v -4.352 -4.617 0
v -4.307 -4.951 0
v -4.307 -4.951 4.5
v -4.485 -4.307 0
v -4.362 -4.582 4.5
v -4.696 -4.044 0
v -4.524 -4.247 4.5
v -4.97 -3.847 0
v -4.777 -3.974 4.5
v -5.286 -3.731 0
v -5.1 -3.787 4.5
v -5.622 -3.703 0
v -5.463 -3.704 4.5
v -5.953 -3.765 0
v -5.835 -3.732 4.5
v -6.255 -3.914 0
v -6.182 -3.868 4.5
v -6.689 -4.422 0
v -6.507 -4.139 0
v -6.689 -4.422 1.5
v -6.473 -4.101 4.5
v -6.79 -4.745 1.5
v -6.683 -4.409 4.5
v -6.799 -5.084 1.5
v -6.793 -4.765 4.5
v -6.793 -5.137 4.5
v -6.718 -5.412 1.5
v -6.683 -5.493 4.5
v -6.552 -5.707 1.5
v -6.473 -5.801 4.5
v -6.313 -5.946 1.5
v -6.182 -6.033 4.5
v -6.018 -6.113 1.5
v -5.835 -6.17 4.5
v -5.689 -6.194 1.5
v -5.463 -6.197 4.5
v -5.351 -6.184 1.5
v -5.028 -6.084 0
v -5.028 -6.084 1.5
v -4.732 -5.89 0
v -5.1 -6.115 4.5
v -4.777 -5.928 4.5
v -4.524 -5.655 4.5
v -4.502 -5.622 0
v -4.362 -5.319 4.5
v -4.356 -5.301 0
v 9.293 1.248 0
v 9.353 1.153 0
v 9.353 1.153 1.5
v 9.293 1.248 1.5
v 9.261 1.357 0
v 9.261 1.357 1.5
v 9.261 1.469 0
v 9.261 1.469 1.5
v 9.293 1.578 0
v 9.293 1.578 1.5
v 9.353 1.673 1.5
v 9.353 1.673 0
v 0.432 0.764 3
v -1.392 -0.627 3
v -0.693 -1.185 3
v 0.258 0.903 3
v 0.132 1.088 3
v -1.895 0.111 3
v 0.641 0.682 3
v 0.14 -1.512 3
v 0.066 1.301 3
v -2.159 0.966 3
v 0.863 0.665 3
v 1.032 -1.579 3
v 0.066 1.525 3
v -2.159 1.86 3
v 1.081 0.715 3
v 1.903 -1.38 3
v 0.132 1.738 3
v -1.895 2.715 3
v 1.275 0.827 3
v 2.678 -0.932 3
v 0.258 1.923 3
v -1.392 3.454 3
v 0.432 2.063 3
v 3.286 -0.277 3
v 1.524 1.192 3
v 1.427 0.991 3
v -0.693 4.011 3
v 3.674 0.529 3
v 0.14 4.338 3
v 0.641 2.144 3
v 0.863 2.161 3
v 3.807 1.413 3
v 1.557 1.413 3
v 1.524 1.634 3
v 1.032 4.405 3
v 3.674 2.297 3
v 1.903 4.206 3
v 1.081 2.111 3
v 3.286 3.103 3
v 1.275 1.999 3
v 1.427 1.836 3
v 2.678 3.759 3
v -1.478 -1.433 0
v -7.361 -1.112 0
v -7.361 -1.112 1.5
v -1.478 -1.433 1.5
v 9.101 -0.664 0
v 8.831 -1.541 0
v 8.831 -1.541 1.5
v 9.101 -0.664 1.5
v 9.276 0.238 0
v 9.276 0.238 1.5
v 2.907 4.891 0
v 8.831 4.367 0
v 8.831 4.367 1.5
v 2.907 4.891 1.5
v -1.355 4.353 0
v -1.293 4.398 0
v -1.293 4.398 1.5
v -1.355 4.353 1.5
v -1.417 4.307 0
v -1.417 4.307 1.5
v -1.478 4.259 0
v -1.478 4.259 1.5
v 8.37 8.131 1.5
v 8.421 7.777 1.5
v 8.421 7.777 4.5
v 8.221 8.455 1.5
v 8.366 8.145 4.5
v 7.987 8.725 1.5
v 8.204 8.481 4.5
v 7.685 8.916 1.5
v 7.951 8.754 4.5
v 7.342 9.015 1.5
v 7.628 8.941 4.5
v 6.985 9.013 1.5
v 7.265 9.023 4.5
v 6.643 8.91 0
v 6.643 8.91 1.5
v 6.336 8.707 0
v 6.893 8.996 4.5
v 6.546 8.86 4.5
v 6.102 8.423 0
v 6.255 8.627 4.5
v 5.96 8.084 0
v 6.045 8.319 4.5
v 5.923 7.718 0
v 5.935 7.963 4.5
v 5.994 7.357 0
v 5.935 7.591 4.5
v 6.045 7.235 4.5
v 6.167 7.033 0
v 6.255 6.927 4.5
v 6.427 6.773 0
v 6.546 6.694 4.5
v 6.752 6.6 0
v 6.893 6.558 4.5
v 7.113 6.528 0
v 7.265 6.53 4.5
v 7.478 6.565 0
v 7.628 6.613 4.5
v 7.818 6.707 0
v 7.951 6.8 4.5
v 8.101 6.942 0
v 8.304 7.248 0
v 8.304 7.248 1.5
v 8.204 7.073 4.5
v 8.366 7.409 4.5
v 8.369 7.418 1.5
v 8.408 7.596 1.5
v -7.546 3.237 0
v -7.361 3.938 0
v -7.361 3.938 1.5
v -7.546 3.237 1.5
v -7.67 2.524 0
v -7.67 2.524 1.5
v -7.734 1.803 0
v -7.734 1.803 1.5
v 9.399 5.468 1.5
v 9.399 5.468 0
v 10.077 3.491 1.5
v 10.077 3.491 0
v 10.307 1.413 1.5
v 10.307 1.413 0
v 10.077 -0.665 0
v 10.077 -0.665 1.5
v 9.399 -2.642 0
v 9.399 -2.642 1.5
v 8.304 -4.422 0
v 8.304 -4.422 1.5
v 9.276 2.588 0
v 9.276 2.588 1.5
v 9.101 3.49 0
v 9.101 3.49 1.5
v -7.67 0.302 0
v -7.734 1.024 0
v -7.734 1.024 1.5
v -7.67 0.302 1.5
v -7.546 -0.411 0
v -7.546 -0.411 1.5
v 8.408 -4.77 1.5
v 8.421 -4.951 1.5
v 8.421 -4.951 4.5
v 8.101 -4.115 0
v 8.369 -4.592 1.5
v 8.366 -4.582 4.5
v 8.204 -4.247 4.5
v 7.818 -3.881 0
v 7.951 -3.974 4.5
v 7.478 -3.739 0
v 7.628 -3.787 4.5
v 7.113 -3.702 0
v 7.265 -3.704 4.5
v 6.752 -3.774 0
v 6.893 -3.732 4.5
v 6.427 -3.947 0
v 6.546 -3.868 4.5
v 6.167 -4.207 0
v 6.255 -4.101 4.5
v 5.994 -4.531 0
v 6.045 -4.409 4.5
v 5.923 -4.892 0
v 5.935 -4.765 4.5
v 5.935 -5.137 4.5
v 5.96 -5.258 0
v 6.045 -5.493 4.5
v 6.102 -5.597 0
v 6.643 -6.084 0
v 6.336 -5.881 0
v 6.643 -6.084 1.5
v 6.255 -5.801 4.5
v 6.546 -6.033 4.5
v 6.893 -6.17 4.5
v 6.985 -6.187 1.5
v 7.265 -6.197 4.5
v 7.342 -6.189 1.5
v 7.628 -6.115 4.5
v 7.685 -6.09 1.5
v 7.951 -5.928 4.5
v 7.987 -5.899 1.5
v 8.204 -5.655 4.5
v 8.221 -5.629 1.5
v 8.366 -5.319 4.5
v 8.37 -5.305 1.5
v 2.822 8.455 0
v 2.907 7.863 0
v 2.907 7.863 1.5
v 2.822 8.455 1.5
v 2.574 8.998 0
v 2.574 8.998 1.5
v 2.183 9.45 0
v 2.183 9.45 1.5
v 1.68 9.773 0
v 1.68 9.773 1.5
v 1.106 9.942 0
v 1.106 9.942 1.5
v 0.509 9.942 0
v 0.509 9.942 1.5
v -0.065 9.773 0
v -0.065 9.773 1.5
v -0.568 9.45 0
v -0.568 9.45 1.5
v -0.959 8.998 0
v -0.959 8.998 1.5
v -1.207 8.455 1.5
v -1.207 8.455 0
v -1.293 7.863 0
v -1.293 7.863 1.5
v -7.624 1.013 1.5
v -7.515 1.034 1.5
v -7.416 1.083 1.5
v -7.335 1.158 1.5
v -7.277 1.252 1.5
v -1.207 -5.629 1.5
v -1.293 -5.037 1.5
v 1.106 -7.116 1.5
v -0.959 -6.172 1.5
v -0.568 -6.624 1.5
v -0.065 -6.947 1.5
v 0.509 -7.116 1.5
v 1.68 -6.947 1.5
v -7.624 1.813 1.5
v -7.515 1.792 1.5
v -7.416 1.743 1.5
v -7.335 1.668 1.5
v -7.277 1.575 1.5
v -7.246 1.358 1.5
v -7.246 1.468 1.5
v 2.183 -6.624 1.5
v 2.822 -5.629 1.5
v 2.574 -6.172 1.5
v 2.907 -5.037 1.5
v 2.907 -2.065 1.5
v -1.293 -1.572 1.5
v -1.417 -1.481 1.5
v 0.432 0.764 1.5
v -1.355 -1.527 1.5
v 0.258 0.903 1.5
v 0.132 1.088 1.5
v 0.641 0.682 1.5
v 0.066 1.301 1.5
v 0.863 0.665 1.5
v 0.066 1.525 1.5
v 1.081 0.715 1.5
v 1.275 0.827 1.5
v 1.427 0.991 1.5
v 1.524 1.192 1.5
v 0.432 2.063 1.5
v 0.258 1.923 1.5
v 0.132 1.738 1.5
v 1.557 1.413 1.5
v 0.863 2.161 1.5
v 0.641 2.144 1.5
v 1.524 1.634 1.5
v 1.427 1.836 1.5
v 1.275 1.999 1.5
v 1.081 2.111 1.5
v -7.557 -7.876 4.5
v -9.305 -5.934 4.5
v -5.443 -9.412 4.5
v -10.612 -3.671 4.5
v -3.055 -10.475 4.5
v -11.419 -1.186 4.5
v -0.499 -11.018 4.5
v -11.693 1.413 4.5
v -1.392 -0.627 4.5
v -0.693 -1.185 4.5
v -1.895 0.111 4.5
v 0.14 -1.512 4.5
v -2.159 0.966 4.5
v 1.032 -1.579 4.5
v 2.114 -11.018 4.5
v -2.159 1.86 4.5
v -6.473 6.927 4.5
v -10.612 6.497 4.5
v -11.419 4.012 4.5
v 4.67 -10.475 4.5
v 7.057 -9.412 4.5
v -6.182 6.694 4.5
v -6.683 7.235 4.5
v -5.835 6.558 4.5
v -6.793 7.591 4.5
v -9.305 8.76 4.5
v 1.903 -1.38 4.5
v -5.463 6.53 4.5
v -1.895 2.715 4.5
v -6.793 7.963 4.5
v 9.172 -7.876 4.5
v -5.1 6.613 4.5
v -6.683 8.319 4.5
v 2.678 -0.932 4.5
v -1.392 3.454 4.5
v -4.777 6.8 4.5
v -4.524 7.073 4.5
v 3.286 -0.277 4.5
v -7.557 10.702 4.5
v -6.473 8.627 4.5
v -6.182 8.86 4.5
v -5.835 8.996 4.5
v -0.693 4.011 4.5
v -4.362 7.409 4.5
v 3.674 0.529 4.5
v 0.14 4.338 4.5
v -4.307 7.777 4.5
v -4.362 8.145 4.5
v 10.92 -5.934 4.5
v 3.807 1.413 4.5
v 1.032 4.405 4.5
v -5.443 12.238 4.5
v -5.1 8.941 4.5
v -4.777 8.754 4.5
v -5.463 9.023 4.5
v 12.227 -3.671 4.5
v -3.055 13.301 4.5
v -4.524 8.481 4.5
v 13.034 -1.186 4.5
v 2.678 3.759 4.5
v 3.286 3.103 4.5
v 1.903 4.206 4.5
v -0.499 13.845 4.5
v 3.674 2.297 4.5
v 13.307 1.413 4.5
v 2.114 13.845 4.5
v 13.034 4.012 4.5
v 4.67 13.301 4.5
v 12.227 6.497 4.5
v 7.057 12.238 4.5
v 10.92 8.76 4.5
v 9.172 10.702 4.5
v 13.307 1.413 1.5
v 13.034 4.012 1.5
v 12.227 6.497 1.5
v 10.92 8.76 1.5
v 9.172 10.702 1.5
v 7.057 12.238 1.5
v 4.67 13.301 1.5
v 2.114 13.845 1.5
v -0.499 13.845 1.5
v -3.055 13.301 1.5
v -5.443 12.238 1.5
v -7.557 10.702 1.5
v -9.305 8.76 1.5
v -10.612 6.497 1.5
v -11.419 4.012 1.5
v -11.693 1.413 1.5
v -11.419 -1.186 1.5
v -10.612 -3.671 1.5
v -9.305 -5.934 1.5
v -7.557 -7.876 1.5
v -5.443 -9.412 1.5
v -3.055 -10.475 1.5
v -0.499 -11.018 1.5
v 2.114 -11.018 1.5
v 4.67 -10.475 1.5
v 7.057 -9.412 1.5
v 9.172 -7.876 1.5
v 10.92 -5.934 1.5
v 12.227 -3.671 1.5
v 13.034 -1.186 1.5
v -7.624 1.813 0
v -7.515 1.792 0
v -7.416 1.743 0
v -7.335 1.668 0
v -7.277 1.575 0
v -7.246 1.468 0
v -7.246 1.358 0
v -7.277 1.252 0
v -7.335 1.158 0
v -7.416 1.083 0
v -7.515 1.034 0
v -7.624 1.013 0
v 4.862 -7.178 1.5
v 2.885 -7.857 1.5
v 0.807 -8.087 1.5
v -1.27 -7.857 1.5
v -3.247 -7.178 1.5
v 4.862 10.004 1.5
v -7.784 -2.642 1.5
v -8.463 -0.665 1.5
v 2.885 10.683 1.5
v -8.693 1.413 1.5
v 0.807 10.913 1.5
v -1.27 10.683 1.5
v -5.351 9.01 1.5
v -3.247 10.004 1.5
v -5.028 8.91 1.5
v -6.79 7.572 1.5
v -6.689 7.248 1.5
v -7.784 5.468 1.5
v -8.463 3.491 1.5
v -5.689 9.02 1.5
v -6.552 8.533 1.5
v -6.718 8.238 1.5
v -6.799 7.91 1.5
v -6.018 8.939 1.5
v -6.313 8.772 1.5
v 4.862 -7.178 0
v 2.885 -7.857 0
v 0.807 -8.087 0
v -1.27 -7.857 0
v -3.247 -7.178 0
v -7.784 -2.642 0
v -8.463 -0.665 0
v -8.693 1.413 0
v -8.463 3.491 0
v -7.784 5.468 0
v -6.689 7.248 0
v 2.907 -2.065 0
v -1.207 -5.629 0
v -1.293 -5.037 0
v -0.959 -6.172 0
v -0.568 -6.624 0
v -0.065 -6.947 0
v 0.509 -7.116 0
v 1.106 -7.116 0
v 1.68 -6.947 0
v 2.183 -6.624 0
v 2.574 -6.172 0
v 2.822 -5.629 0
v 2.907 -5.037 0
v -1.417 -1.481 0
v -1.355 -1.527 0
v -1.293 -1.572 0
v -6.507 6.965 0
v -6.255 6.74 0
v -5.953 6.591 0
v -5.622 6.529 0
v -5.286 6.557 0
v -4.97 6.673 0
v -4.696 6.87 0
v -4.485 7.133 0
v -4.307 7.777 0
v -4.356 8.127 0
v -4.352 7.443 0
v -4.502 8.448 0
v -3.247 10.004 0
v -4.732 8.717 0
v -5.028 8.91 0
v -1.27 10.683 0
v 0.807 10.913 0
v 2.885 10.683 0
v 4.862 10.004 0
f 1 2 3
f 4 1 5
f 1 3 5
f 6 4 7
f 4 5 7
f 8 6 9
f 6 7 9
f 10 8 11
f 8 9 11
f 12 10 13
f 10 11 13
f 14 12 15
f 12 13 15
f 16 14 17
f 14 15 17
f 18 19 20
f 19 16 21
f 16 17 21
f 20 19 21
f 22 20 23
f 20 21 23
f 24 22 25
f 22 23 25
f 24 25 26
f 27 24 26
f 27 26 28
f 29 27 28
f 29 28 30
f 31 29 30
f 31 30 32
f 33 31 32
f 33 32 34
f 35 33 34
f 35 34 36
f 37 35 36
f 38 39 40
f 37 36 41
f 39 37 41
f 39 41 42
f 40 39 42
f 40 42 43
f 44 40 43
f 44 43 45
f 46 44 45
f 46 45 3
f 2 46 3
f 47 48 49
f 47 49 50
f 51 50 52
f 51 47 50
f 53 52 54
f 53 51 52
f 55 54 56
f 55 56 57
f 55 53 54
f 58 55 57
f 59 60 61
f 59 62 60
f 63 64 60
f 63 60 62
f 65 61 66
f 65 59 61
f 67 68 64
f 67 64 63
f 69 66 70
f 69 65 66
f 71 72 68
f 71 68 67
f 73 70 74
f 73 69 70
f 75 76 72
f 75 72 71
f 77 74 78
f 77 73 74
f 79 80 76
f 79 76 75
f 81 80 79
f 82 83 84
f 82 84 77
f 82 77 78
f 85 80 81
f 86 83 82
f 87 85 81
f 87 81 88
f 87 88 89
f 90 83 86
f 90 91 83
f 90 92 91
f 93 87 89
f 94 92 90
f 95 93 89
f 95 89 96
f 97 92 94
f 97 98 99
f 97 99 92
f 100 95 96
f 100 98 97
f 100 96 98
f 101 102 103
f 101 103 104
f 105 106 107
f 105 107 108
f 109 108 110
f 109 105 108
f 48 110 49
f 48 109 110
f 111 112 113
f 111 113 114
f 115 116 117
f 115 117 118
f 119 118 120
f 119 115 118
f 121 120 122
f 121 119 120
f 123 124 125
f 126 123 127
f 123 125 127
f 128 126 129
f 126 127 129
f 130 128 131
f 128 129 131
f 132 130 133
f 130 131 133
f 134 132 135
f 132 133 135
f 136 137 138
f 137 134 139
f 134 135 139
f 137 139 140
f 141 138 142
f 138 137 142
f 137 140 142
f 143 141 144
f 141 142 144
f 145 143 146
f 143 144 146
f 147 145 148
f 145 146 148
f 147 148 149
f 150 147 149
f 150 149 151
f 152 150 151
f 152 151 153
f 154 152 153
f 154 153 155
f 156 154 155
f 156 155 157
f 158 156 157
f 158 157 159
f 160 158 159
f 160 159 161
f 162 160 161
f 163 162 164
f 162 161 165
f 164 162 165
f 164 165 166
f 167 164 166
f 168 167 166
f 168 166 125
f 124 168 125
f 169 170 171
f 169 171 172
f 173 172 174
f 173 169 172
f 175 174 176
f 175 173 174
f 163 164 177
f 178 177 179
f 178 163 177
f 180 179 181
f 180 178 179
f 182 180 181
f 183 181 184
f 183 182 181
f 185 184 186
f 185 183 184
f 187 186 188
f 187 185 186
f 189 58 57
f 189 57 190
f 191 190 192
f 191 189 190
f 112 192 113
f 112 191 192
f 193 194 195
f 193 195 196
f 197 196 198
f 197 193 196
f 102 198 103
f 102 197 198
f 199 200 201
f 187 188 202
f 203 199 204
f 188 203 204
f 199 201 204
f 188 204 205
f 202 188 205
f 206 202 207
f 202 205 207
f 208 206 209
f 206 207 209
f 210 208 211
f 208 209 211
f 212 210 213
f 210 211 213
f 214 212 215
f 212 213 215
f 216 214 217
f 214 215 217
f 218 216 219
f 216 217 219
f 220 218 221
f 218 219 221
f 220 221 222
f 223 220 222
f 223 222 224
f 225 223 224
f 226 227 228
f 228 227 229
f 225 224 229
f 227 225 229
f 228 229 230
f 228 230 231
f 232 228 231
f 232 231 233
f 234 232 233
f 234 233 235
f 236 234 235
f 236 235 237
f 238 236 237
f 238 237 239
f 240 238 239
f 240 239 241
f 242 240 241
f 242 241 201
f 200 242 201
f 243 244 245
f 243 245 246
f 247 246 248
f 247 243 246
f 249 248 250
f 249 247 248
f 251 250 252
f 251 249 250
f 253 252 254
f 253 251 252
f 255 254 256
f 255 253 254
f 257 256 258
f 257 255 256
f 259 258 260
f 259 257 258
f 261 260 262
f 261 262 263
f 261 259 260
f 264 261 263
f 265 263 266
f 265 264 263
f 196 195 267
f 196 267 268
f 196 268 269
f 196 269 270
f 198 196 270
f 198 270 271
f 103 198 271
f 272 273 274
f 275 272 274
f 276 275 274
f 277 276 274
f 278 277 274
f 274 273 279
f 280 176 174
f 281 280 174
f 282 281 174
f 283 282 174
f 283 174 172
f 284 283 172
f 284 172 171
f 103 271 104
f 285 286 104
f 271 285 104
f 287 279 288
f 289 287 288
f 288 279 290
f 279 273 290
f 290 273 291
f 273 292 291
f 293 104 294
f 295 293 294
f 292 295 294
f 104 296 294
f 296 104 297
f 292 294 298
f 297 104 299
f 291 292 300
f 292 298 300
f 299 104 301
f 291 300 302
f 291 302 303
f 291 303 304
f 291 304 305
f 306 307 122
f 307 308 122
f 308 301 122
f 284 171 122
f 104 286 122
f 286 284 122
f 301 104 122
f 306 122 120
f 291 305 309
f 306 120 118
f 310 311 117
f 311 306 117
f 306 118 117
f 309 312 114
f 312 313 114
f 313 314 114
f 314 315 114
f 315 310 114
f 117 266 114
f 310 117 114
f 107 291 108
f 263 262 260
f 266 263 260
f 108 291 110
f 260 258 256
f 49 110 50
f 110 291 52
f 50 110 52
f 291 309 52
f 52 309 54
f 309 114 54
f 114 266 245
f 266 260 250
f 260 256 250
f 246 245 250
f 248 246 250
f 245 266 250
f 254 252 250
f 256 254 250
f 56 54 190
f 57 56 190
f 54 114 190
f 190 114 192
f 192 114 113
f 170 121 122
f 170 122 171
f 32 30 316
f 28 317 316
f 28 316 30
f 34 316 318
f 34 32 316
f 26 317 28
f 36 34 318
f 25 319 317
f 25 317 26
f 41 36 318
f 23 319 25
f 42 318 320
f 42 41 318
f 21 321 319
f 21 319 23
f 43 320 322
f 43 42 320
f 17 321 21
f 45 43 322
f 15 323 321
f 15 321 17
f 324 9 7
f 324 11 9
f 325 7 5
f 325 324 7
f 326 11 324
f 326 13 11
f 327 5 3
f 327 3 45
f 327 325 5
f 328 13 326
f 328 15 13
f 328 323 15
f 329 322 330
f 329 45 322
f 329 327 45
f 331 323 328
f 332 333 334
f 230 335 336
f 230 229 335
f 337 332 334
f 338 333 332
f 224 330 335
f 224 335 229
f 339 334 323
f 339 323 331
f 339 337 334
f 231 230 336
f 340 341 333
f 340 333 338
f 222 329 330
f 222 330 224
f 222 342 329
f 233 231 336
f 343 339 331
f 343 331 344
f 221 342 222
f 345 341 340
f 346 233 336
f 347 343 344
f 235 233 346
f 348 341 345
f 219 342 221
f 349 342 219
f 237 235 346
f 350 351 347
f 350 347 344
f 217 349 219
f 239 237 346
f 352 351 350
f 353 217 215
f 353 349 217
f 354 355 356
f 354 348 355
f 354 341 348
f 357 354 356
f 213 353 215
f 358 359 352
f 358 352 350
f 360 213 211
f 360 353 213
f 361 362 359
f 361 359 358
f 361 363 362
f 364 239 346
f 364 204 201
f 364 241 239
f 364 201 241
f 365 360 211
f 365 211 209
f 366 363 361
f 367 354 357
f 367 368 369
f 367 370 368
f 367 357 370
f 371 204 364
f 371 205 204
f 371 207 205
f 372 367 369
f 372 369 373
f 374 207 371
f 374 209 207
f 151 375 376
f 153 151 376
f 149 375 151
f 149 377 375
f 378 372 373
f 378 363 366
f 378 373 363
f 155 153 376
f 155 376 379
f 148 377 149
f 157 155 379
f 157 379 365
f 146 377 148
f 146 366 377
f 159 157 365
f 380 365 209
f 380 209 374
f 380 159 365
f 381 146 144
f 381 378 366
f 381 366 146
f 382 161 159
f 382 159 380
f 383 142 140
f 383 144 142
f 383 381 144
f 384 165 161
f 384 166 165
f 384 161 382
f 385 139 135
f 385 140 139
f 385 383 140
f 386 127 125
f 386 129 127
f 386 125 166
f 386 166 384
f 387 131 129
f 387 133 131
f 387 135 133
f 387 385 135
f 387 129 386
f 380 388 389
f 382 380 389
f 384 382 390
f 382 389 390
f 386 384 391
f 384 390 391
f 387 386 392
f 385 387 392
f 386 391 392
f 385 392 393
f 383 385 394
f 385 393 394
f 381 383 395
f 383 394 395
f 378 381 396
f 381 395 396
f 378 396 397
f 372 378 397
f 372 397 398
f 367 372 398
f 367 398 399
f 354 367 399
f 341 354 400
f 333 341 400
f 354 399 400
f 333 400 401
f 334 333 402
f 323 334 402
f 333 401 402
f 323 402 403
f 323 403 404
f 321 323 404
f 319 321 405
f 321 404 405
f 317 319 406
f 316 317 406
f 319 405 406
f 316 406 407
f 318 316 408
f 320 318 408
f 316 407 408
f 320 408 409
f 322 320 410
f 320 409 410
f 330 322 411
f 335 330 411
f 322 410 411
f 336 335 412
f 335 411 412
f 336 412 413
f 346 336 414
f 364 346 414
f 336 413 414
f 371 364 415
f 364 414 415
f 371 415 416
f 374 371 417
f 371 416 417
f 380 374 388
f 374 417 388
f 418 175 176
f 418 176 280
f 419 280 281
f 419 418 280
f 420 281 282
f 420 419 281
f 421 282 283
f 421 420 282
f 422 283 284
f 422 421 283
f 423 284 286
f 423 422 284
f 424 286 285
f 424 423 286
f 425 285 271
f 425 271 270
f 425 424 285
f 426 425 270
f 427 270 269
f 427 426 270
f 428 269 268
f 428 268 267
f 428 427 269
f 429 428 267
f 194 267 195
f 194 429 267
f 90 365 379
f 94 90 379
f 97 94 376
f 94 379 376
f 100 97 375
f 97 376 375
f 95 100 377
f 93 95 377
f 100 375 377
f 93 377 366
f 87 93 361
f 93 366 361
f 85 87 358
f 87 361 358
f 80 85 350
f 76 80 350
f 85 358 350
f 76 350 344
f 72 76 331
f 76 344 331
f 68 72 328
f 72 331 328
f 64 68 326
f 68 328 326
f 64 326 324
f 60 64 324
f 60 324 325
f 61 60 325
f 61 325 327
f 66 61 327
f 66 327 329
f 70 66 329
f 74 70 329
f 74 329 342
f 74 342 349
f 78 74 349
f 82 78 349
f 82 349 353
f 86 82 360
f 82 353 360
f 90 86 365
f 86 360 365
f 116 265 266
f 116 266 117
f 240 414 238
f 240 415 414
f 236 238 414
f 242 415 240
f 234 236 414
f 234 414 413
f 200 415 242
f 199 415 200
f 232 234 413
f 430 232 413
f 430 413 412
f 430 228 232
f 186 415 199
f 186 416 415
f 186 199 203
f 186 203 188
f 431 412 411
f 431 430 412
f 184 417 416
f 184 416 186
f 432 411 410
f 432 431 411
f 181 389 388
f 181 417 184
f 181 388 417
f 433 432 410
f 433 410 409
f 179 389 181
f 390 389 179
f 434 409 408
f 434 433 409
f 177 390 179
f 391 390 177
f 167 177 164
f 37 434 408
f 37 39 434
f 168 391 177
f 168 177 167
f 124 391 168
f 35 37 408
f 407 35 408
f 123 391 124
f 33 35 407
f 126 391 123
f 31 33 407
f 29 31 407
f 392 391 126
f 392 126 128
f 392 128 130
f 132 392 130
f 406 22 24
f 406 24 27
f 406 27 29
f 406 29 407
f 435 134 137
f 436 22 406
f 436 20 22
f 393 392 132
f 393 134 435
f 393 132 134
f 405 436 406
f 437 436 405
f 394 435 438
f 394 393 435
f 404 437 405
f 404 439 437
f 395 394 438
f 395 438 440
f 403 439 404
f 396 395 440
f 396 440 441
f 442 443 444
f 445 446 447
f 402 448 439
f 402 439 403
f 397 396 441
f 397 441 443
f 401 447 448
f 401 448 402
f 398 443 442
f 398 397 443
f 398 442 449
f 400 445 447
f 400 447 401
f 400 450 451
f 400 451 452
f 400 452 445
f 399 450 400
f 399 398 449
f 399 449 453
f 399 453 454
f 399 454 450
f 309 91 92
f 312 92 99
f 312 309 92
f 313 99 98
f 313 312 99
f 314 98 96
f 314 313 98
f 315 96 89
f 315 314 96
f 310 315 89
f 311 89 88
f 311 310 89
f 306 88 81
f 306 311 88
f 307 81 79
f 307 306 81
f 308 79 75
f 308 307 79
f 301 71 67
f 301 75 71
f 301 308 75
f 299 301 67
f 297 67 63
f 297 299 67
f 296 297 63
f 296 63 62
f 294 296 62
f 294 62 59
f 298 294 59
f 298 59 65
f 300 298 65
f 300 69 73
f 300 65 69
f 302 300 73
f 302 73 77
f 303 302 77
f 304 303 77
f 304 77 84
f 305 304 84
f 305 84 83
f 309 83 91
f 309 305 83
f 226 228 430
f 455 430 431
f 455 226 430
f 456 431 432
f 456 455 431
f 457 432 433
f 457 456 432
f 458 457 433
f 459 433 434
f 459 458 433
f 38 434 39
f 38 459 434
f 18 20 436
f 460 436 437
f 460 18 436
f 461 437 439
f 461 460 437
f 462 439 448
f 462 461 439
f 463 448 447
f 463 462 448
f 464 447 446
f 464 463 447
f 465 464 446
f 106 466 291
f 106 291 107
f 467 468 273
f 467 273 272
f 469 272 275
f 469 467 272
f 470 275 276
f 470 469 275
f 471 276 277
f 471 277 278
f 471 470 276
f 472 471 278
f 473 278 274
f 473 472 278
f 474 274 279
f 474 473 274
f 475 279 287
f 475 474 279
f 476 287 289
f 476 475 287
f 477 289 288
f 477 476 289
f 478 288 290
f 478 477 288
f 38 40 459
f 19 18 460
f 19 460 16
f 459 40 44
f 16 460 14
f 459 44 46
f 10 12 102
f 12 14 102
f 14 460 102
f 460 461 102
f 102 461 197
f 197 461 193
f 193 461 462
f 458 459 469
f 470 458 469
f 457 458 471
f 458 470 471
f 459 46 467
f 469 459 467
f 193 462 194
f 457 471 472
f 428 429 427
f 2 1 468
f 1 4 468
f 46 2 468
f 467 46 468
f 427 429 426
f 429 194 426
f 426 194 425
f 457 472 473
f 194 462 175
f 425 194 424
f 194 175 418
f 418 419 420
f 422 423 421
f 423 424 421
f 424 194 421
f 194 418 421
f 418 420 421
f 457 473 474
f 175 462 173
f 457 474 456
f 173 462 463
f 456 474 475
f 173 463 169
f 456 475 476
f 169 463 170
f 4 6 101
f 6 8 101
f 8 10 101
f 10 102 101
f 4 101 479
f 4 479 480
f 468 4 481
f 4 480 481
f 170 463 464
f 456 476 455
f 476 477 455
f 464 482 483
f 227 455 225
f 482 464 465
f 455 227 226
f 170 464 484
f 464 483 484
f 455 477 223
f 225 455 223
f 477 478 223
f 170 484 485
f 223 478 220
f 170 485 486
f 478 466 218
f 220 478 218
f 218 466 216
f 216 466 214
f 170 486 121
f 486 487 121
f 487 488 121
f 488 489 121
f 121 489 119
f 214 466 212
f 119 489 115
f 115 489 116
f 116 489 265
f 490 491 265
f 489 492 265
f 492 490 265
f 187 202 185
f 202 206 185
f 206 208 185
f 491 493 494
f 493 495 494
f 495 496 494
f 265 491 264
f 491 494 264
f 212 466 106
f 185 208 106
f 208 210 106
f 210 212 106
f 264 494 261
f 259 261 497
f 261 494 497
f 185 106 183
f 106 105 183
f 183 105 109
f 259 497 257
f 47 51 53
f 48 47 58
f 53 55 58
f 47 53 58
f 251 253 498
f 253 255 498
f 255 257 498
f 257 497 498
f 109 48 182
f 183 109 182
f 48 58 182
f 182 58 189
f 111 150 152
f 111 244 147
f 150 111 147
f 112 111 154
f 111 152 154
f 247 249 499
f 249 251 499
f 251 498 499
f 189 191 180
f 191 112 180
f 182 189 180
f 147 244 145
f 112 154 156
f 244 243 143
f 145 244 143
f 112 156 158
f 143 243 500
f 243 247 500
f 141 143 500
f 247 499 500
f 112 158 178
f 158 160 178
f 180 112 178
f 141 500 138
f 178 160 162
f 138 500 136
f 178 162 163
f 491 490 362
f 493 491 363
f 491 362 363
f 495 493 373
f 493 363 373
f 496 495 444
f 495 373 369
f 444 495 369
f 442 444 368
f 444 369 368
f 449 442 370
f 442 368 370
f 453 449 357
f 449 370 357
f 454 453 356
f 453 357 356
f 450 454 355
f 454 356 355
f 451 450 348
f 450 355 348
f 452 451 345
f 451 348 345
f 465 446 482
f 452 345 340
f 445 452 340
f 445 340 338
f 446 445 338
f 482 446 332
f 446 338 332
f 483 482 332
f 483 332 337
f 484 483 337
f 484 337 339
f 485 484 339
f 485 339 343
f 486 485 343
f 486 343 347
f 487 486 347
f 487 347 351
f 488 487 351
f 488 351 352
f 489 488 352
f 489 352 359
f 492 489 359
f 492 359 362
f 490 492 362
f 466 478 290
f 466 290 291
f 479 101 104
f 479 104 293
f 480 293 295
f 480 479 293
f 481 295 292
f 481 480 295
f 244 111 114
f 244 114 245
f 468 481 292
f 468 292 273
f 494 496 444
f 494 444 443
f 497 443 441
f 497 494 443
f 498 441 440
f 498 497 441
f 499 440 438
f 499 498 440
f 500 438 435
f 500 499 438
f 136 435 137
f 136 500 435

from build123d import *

# Parameters (mm, degrees)
SKETCH1_R           = 12.5
BOSS_EXTRUDE1_DEPTH = 1.5
SKETCH2_R           = 12.5
SKETCH2_R_2         = 0.75
BOSS_EXTRUDE2_DEPTH = 3
SKETCH3_R           = 1.25
CUT_EXTRUDE1_DEPTH  = 20.771458422
SKETCH4_R           = 12.5
SKETCH4_R_2         = 9.5
CUT_EXTRUDE2_DEPTH  = 1.5
SKETCH5_R           = 3
CUT_EXTRUDE3_DEPTH  = 1.5


with BuildPart() as part:
    # Sketch1 → Boss-Extrude1 (new body)
    with BuildSketch(Plane.XY):
        with Locations((0.807446417, 1.413031229)):
            Circle(SKETCH1_R)
        with BuildLine():
            Line((2.907446417, -2.065401928), (8.830836384, -1.541239144))
            ThreePointArc((8.830836384, -1.541239144), (9.200973023, -0.215222775), (9.353491615, 1.153009157))
            ThreePointArc((9.353491615, 1.153009157), (9.257446417, 1.413031229), (9.353491615, 1.673053302))
            ThreePointArc((9.353491615, 1.673053302), (9.200973023, 3.041285234), (8.830836384, 4.367301602))
            Line((8.830836384, 4.367301602), (2.907446417, 4.891464387))
            Line((2.907446417, 4.891464387), (2.907446417, 7.863031229))
            ThreePointArc((2.907446417, 7.863031229), (0.807446417, 9.963031229), (-1.292553583, 7.863031229))
            Line((-1.292553583, 7.863031229), (-1.292553583, 4.398412277))
            ThreePointArc((-1.292553583, 4.398412277), (-1.386241751, 4.330261461), (-1.477719845, 4.259171626))
            Line((-1.477719845, 4.259171626), (-7.361314725, 3.937678018))
            ThreePointArc((-7.361314725, 3.937678018), (-7.615427173, 2.881942556), (-7.733677844, 1.80251341))
            ThreePointArc((-7.733677844, 1.80251341), (-7.242553583, 1.413031229), (-7.733677844, 1.023549049))
            ThreePointArc((-7.733677844, 1.023549049), (-7.615427173, -0.055880097), (-7.361314725, -1.11161556))
            Line((-7.361314725, -1.11161556), (-1.477719845, -1.433109167))
            ThreePointArc((-1.477719845, -1.433109167), (-1.386241751, -1.504199002), (-1.292553583, -1.572349818))
            Line((-1.292553583, -1.572349818), (-1.292553583, -5.036968771))
            ThreePointArc((-1.292553583, -5.036968771), (0.807446417, -7.136968771), (2.907446417, -5.036968771))
            Line((2.907446417, -5.036968771), (2.907446417, -2.065401928))
        make_face(mode=Mode.SUBTRACT)
    extrude(amount=BOSS_EXTRUDE1_DEPTH)

    # Sketch2 → Boss-Extrude2 (add)
    with BuildSketch(Plane.XY.offset(1.5)):
        with Locations((0.807446417, 1.413031229)):
            Circle(SKETCH2_R)
        with Locations((0.807446417, 1.413031229)):
            Circle(SKETCH2_R_2, mode=Mode.SUBTRACT)
    extrude(amount=BOSS_EXTRUDE2_DEPTH)

    # Sketch3 → Cut-Extrude1 (cut, through all)
    with BuildSketch(Plane.XY.offset(4.5)):
        with Locations((7.171407447, 7.77699226)):
            Circle(SKETCH3_R)
        with Locations((7.171407447, -4.950929801)):
            Circle(SKETCH3_R)
        with Locations((-5.556514614, -4.950929801)):
            Circle(SKETCH3_R)
        with Locations((-5.556514614, 7.77699226)):
            Circle(SKETCH3_R)
    extrude(amount=-CUT_EXTRUDE1_DEPTH, mode=Mode.SUBTRACT)

    # Sketch4 → Cut-Extrude2 (cut)
    with BuildSketch(Plane(origin=(0, 0, 0), x_dir=(-1, 0, 0), z_dir=(0, 0, -1))):
        with Locations((-0.807446417, 1.413031229)):
            Circle(SKETCH4_R)
        with Locations((-0.807446417, 1.413031229)):
            Circle(SKETCH4_R_2, mode=Mode.SUBTRACT)
    extrude(amount=-CUT_EXTRUDE2_DEPTH, mode=Mode.SUBTRACT)

    # Sketch5 → Cut-Extrude3 (cut)
    with BuildSketch(Plane.XY.offset(4.5)):
        with Locations((0.807446417, 1.413031229)):
            Circle(SKETCH5_R)
    extrude(amount=-CUT_EXTRUDE3_DEPTH, mode=Mode.SUBTRACT)


solid = part.part
